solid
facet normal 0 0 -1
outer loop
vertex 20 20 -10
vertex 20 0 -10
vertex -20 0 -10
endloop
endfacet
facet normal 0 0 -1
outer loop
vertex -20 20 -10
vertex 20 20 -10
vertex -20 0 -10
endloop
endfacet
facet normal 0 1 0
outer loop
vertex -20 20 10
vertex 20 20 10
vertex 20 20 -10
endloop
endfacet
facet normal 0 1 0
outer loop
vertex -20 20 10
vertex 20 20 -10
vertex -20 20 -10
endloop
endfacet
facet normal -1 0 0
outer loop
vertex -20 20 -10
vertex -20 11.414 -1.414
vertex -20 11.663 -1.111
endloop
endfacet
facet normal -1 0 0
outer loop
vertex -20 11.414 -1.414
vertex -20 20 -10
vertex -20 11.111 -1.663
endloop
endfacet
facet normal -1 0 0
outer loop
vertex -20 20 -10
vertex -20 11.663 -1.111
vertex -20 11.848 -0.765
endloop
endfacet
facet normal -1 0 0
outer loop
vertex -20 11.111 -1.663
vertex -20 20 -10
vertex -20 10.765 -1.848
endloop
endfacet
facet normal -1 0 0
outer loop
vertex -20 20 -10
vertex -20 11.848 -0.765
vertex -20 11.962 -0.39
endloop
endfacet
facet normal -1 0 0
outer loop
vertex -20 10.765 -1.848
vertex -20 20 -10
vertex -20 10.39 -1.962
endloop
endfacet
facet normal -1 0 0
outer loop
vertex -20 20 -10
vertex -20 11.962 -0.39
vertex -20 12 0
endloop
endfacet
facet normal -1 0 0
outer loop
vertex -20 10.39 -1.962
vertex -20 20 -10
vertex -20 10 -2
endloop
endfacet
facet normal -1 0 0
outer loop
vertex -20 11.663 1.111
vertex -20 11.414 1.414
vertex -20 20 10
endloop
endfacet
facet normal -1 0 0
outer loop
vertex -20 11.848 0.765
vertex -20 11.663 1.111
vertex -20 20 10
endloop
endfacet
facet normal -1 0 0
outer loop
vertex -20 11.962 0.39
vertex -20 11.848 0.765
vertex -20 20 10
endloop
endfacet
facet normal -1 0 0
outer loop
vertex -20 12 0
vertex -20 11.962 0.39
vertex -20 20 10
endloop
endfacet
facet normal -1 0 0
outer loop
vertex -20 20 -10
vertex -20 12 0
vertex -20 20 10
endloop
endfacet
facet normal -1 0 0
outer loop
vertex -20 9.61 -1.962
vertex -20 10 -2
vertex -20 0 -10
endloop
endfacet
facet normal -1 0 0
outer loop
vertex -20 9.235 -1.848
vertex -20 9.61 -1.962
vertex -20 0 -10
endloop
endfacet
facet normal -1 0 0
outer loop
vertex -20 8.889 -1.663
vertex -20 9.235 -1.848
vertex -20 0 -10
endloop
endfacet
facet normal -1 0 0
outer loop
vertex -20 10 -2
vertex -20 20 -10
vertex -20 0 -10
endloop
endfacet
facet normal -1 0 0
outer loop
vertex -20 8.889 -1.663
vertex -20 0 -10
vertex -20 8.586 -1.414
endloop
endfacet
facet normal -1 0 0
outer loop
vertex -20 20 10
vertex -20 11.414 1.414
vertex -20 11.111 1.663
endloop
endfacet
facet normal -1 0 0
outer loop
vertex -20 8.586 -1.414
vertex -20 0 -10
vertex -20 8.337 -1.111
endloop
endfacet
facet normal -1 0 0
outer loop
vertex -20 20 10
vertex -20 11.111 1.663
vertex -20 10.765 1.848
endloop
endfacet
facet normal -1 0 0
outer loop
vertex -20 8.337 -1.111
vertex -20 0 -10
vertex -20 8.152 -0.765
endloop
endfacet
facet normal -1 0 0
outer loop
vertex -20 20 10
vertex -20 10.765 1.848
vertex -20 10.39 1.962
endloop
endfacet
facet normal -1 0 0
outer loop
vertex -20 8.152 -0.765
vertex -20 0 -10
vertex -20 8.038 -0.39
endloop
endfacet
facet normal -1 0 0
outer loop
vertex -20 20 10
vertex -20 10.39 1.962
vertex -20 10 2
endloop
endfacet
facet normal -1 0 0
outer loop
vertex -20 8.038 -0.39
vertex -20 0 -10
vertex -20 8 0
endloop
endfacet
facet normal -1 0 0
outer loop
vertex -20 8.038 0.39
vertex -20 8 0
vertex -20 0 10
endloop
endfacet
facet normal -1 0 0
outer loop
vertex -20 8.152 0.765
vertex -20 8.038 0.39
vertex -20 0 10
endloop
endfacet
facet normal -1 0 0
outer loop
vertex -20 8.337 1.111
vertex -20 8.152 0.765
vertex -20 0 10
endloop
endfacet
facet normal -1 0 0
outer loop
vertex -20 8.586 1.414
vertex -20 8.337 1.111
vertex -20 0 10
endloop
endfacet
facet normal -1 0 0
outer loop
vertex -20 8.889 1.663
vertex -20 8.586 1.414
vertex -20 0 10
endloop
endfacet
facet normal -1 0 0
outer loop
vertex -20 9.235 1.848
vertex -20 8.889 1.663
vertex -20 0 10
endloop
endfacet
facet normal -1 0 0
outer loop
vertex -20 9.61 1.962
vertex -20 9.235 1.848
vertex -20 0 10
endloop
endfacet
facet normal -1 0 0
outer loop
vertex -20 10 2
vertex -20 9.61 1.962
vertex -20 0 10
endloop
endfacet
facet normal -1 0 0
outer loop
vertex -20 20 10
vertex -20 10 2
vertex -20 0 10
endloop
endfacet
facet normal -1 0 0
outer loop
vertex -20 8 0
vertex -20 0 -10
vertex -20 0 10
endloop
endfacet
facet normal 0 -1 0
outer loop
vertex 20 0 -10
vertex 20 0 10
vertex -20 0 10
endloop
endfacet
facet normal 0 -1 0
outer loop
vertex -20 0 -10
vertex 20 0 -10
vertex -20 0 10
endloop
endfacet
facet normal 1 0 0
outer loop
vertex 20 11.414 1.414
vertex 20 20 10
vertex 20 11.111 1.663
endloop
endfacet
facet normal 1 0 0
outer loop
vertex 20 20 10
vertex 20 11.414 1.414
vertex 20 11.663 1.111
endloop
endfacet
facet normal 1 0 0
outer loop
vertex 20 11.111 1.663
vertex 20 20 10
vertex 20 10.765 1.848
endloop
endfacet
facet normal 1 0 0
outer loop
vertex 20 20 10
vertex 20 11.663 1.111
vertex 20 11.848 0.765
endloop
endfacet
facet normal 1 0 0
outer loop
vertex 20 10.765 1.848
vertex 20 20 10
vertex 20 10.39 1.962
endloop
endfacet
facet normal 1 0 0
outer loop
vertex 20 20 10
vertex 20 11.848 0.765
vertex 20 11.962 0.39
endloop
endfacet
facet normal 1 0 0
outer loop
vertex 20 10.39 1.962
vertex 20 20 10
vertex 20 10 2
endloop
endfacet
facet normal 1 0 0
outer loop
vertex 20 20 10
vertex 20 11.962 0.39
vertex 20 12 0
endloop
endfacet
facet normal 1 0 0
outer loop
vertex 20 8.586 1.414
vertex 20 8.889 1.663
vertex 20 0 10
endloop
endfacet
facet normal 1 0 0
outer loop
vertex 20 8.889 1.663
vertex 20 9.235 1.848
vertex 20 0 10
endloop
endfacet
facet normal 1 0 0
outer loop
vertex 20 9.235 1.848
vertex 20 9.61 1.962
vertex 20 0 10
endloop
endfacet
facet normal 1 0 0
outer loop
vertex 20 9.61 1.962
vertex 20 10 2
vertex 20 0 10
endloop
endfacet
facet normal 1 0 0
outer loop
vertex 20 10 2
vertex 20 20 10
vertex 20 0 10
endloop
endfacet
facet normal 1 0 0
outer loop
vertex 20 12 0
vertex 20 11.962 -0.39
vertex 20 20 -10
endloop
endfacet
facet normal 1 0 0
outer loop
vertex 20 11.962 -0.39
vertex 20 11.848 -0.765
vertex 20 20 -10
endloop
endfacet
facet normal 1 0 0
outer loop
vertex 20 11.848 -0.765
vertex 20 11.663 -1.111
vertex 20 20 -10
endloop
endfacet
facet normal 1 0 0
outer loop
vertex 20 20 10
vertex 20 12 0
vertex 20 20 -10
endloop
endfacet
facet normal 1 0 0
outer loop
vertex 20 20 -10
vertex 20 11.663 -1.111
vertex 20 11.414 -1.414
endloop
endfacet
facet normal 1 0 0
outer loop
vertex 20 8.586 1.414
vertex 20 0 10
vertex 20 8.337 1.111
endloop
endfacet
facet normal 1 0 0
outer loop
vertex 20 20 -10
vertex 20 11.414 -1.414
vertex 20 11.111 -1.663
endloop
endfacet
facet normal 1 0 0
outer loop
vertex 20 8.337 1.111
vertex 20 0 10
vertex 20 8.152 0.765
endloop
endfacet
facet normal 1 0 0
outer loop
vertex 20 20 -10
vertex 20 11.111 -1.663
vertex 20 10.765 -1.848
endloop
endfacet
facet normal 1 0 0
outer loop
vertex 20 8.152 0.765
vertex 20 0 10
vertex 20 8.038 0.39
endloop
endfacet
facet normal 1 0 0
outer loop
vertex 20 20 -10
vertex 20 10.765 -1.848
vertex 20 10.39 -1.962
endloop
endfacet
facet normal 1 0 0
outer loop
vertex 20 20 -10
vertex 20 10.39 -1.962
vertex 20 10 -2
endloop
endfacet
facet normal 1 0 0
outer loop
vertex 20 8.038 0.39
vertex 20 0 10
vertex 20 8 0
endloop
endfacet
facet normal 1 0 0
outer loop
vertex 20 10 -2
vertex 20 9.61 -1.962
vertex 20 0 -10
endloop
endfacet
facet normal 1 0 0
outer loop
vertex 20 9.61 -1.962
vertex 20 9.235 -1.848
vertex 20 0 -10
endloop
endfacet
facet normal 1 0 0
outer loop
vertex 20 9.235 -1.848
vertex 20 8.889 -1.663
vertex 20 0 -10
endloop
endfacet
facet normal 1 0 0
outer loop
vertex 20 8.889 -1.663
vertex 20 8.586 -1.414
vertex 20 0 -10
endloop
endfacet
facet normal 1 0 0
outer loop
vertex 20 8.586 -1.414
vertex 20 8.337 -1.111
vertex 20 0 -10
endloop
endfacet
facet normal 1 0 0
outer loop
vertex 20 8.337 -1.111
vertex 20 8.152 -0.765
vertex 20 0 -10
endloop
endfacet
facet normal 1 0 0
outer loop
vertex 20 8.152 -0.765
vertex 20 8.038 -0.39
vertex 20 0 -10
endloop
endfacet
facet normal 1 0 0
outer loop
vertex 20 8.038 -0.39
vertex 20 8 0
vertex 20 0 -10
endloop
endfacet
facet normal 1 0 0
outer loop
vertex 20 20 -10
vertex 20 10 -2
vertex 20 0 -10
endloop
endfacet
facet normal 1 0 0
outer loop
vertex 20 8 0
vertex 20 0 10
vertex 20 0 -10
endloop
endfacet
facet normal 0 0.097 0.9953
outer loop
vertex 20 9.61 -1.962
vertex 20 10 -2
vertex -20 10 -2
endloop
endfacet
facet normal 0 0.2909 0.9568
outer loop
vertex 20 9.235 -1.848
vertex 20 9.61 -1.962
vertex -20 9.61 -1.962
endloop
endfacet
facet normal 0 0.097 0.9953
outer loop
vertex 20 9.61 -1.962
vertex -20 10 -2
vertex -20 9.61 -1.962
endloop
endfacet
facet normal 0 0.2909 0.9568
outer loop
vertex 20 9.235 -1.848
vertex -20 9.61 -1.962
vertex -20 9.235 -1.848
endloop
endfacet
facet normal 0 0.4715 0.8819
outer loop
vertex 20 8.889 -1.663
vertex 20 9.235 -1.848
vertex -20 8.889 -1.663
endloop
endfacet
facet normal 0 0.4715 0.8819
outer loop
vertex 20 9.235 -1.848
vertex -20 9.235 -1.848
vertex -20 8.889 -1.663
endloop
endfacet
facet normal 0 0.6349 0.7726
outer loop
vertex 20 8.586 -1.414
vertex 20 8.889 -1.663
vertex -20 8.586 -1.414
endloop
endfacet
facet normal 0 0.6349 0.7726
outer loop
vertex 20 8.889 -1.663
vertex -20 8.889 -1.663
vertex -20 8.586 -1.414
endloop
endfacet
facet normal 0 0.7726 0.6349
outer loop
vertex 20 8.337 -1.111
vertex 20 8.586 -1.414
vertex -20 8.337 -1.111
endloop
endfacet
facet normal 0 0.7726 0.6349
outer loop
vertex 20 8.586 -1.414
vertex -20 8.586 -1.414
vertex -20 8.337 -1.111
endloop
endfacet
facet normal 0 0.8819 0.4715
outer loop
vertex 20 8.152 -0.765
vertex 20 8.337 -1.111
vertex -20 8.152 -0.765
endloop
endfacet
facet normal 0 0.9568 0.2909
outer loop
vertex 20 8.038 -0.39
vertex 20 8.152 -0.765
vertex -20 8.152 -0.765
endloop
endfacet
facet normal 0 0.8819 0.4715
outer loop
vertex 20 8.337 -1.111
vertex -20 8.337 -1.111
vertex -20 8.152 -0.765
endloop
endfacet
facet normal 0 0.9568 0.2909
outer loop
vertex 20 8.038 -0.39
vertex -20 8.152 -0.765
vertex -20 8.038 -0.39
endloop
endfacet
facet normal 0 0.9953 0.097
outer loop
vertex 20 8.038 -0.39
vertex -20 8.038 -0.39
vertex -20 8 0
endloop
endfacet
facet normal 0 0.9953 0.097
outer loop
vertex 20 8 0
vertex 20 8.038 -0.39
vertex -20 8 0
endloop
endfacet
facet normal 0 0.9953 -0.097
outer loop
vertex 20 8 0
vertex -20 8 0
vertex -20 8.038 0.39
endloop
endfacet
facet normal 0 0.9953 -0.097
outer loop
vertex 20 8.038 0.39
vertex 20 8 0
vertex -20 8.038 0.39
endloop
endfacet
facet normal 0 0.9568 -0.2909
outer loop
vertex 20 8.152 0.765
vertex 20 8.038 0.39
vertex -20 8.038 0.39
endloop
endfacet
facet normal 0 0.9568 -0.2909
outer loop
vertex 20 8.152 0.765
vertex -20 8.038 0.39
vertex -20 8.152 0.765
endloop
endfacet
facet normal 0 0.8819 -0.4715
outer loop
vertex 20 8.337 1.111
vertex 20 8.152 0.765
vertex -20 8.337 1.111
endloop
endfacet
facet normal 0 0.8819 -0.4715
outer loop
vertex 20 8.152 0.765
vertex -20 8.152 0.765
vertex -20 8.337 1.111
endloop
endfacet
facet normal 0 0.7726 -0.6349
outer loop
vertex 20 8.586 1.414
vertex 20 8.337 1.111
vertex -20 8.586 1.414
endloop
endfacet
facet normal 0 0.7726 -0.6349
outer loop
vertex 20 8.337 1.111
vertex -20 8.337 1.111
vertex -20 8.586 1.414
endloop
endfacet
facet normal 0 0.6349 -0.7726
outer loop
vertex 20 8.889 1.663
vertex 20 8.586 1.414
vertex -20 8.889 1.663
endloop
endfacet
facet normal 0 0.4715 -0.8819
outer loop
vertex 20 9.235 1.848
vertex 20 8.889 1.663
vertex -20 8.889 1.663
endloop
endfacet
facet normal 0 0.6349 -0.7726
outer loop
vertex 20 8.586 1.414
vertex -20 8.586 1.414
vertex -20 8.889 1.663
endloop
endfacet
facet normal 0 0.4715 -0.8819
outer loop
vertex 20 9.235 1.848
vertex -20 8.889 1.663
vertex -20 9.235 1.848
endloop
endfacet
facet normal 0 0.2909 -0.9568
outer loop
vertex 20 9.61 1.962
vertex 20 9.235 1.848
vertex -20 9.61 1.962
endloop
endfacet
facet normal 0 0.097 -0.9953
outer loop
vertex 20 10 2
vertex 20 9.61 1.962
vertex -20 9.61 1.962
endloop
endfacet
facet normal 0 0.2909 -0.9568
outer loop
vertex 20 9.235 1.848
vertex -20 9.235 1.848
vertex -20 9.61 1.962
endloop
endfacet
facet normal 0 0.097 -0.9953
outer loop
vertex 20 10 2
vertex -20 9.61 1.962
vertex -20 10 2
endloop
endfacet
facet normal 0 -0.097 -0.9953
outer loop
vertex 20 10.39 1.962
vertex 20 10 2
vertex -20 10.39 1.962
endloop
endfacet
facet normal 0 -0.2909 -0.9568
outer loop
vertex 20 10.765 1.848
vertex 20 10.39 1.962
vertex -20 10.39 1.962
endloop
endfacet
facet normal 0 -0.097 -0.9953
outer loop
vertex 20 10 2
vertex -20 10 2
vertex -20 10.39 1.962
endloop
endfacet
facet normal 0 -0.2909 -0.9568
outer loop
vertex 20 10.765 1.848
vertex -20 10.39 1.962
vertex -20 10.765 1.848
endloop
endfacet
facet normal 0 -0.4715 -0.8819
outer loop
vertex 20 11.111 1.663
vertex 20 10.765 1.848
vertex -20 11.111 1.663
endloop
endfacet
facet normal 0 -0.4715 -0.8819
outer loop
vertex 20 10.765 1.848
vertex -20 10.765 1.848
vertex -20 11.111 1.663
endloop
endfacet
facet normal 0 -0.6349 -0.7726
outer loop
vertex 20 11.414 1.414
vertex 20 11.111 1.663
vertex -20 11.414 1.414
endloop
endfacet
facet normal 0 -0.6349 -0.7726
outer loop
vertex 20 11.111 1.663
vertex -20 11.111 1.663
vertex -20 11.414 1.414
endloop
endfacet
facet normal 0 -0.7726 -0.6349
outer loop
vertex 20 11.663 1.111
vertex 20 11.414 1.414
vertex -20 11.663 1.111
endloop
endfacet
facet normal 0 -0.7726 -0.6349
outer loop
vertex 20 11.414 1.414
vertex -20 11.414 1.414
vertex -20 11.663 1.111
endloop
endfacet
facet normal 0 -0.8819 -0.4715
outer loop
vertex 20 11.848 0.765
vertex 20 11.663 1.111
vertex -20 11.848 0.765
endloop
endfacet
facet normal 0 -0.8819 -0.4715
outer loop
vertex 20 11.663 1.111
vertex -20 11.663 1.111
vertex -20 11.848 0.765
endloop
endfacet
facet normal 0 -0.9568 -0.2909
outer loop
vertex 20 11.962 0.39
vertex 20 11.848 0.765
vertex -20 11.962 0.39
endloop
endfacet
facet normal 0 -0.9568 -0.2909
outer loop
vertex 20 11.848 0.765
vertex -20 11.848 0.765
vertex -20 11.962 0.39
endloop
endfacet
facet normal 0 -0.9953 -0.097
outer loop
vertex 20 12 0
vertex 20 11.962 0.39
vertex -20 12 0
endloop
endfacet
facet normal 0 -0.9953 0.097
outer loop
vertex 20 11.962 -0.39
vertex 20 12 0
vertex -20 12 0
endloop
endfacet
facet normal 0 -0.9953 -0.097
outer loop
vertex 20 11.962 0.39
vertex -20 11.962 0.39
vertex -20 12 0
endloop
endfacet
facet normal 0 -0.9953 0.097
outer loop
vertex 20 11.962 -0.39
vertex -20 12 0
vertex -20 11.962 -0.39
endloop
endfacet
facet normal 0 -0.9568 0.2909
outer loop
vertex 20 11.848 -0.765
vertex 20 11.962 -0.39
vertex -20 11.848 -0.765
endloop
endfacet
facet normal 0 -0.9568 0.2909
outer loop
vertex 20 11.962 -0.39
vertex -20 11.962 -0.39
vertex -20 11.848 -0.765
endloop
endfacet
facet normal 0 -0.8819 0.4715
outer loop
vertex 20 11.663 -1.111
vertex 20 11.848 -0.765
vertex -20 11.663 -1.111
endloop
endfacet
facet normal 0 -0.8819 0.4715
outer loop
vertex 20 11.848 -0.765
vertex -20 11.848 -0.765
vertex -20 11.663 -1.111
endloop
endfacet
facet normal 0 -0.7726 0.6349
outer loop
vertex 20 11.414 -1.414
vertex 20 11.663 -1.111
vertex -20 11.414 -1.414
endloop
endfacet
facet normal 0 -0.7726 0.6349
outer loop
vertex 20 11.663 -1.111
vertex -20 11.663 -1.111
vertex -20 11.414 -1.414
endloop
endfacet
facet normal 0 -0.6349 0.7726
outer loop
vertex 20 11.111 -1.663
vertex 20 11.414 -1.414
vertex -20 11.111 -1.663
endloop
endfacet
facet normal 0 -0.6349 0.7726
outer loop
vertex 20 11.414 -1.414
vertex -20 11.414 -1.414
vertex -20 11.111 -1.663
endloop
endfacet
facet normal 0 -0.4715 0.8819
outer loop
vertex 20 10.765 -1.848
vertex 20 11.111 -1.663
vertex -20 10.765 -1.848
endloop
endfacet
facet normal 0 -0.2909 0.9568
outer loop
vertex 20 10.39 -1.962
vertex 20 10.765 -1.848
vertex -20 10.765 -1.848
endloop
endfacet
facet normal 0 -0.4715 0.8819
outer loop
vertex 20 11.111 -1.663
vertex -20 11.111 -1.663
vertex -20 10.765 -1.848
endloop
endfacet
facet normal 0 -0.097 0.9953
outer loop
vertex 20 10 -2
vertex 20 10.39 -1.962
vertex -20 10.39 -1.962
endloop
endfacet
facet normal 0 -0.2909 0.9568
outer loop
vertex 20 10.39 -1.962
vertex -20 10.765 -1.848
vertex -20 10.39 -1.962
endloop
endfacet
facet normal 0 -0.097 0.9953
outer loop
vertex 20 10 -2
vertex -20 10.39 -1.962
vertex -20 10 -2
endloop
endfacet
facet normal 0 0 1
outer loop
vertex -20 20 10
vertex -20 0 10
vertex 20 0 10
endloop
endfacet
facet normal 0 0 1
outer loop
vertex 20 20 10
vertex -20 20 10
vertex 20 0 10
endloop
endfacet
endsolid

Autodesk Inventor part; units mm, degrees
ref_plane "YZ Plane" through (0, 0, 0) normal (1, 0, 0) x (0, 1, 0)
ref_plane "XZ Plane" through (0, 0, 0) normal (0, 1, 0) x (-1, 0, 0)
ref_plane "XY Plane" through (0, 0, 0) normal (0, 0, 1) x (1, 0, 0)
sketch "Skizze1" plane through (0, 0, 0) normal (0, 1, 0) x (-1, 0, 0)
  line L0 (20, 10) -> (-20, 10)
  line L1 (-20, 10) -> (-20, -10)
  line L2 (-20, -10) -> (20, -10)
  line L3 (20, -10) -> (20, 10)
  line L4 (20, 10) -> (-20, -10) construction
  line L5 (-20, 10) -> (20, -10) construction
  point P0 (0, 0)
  dimension "d0" = 40
  dimension "d1" = 20
extrude "Extrusion1" add sketch "Skizze1" along normal blind 20
sketch "Skizze2" plane through (20, 0, 10) normal (1, 0, 0) x (0, 0, -1)
  circle A0 centre (10, 10) radius 2.5
  line L0 (0, 20) -> (20, 20) projected
  line L1 (0, 0) -> (20, 0) projected
  line L2 (20, 0) -> (20, 20) projected
  line L3 (0, 0) -> (0, 20) projected
  point P0 (10, 0)
  dimension "d4" = 5
  dimension "d5" = 10
  dimension "d6" = 10
  dimension "d7" = 10
  dimension "d8" = 10
hole "Bohrung1" at (20, 10, 0) direction (-1, 0, 0) diameter 4 end through all
equation "\"d5\" = d6"
equation "\"d7\" = d8"
properties part number "Z-Joint"
